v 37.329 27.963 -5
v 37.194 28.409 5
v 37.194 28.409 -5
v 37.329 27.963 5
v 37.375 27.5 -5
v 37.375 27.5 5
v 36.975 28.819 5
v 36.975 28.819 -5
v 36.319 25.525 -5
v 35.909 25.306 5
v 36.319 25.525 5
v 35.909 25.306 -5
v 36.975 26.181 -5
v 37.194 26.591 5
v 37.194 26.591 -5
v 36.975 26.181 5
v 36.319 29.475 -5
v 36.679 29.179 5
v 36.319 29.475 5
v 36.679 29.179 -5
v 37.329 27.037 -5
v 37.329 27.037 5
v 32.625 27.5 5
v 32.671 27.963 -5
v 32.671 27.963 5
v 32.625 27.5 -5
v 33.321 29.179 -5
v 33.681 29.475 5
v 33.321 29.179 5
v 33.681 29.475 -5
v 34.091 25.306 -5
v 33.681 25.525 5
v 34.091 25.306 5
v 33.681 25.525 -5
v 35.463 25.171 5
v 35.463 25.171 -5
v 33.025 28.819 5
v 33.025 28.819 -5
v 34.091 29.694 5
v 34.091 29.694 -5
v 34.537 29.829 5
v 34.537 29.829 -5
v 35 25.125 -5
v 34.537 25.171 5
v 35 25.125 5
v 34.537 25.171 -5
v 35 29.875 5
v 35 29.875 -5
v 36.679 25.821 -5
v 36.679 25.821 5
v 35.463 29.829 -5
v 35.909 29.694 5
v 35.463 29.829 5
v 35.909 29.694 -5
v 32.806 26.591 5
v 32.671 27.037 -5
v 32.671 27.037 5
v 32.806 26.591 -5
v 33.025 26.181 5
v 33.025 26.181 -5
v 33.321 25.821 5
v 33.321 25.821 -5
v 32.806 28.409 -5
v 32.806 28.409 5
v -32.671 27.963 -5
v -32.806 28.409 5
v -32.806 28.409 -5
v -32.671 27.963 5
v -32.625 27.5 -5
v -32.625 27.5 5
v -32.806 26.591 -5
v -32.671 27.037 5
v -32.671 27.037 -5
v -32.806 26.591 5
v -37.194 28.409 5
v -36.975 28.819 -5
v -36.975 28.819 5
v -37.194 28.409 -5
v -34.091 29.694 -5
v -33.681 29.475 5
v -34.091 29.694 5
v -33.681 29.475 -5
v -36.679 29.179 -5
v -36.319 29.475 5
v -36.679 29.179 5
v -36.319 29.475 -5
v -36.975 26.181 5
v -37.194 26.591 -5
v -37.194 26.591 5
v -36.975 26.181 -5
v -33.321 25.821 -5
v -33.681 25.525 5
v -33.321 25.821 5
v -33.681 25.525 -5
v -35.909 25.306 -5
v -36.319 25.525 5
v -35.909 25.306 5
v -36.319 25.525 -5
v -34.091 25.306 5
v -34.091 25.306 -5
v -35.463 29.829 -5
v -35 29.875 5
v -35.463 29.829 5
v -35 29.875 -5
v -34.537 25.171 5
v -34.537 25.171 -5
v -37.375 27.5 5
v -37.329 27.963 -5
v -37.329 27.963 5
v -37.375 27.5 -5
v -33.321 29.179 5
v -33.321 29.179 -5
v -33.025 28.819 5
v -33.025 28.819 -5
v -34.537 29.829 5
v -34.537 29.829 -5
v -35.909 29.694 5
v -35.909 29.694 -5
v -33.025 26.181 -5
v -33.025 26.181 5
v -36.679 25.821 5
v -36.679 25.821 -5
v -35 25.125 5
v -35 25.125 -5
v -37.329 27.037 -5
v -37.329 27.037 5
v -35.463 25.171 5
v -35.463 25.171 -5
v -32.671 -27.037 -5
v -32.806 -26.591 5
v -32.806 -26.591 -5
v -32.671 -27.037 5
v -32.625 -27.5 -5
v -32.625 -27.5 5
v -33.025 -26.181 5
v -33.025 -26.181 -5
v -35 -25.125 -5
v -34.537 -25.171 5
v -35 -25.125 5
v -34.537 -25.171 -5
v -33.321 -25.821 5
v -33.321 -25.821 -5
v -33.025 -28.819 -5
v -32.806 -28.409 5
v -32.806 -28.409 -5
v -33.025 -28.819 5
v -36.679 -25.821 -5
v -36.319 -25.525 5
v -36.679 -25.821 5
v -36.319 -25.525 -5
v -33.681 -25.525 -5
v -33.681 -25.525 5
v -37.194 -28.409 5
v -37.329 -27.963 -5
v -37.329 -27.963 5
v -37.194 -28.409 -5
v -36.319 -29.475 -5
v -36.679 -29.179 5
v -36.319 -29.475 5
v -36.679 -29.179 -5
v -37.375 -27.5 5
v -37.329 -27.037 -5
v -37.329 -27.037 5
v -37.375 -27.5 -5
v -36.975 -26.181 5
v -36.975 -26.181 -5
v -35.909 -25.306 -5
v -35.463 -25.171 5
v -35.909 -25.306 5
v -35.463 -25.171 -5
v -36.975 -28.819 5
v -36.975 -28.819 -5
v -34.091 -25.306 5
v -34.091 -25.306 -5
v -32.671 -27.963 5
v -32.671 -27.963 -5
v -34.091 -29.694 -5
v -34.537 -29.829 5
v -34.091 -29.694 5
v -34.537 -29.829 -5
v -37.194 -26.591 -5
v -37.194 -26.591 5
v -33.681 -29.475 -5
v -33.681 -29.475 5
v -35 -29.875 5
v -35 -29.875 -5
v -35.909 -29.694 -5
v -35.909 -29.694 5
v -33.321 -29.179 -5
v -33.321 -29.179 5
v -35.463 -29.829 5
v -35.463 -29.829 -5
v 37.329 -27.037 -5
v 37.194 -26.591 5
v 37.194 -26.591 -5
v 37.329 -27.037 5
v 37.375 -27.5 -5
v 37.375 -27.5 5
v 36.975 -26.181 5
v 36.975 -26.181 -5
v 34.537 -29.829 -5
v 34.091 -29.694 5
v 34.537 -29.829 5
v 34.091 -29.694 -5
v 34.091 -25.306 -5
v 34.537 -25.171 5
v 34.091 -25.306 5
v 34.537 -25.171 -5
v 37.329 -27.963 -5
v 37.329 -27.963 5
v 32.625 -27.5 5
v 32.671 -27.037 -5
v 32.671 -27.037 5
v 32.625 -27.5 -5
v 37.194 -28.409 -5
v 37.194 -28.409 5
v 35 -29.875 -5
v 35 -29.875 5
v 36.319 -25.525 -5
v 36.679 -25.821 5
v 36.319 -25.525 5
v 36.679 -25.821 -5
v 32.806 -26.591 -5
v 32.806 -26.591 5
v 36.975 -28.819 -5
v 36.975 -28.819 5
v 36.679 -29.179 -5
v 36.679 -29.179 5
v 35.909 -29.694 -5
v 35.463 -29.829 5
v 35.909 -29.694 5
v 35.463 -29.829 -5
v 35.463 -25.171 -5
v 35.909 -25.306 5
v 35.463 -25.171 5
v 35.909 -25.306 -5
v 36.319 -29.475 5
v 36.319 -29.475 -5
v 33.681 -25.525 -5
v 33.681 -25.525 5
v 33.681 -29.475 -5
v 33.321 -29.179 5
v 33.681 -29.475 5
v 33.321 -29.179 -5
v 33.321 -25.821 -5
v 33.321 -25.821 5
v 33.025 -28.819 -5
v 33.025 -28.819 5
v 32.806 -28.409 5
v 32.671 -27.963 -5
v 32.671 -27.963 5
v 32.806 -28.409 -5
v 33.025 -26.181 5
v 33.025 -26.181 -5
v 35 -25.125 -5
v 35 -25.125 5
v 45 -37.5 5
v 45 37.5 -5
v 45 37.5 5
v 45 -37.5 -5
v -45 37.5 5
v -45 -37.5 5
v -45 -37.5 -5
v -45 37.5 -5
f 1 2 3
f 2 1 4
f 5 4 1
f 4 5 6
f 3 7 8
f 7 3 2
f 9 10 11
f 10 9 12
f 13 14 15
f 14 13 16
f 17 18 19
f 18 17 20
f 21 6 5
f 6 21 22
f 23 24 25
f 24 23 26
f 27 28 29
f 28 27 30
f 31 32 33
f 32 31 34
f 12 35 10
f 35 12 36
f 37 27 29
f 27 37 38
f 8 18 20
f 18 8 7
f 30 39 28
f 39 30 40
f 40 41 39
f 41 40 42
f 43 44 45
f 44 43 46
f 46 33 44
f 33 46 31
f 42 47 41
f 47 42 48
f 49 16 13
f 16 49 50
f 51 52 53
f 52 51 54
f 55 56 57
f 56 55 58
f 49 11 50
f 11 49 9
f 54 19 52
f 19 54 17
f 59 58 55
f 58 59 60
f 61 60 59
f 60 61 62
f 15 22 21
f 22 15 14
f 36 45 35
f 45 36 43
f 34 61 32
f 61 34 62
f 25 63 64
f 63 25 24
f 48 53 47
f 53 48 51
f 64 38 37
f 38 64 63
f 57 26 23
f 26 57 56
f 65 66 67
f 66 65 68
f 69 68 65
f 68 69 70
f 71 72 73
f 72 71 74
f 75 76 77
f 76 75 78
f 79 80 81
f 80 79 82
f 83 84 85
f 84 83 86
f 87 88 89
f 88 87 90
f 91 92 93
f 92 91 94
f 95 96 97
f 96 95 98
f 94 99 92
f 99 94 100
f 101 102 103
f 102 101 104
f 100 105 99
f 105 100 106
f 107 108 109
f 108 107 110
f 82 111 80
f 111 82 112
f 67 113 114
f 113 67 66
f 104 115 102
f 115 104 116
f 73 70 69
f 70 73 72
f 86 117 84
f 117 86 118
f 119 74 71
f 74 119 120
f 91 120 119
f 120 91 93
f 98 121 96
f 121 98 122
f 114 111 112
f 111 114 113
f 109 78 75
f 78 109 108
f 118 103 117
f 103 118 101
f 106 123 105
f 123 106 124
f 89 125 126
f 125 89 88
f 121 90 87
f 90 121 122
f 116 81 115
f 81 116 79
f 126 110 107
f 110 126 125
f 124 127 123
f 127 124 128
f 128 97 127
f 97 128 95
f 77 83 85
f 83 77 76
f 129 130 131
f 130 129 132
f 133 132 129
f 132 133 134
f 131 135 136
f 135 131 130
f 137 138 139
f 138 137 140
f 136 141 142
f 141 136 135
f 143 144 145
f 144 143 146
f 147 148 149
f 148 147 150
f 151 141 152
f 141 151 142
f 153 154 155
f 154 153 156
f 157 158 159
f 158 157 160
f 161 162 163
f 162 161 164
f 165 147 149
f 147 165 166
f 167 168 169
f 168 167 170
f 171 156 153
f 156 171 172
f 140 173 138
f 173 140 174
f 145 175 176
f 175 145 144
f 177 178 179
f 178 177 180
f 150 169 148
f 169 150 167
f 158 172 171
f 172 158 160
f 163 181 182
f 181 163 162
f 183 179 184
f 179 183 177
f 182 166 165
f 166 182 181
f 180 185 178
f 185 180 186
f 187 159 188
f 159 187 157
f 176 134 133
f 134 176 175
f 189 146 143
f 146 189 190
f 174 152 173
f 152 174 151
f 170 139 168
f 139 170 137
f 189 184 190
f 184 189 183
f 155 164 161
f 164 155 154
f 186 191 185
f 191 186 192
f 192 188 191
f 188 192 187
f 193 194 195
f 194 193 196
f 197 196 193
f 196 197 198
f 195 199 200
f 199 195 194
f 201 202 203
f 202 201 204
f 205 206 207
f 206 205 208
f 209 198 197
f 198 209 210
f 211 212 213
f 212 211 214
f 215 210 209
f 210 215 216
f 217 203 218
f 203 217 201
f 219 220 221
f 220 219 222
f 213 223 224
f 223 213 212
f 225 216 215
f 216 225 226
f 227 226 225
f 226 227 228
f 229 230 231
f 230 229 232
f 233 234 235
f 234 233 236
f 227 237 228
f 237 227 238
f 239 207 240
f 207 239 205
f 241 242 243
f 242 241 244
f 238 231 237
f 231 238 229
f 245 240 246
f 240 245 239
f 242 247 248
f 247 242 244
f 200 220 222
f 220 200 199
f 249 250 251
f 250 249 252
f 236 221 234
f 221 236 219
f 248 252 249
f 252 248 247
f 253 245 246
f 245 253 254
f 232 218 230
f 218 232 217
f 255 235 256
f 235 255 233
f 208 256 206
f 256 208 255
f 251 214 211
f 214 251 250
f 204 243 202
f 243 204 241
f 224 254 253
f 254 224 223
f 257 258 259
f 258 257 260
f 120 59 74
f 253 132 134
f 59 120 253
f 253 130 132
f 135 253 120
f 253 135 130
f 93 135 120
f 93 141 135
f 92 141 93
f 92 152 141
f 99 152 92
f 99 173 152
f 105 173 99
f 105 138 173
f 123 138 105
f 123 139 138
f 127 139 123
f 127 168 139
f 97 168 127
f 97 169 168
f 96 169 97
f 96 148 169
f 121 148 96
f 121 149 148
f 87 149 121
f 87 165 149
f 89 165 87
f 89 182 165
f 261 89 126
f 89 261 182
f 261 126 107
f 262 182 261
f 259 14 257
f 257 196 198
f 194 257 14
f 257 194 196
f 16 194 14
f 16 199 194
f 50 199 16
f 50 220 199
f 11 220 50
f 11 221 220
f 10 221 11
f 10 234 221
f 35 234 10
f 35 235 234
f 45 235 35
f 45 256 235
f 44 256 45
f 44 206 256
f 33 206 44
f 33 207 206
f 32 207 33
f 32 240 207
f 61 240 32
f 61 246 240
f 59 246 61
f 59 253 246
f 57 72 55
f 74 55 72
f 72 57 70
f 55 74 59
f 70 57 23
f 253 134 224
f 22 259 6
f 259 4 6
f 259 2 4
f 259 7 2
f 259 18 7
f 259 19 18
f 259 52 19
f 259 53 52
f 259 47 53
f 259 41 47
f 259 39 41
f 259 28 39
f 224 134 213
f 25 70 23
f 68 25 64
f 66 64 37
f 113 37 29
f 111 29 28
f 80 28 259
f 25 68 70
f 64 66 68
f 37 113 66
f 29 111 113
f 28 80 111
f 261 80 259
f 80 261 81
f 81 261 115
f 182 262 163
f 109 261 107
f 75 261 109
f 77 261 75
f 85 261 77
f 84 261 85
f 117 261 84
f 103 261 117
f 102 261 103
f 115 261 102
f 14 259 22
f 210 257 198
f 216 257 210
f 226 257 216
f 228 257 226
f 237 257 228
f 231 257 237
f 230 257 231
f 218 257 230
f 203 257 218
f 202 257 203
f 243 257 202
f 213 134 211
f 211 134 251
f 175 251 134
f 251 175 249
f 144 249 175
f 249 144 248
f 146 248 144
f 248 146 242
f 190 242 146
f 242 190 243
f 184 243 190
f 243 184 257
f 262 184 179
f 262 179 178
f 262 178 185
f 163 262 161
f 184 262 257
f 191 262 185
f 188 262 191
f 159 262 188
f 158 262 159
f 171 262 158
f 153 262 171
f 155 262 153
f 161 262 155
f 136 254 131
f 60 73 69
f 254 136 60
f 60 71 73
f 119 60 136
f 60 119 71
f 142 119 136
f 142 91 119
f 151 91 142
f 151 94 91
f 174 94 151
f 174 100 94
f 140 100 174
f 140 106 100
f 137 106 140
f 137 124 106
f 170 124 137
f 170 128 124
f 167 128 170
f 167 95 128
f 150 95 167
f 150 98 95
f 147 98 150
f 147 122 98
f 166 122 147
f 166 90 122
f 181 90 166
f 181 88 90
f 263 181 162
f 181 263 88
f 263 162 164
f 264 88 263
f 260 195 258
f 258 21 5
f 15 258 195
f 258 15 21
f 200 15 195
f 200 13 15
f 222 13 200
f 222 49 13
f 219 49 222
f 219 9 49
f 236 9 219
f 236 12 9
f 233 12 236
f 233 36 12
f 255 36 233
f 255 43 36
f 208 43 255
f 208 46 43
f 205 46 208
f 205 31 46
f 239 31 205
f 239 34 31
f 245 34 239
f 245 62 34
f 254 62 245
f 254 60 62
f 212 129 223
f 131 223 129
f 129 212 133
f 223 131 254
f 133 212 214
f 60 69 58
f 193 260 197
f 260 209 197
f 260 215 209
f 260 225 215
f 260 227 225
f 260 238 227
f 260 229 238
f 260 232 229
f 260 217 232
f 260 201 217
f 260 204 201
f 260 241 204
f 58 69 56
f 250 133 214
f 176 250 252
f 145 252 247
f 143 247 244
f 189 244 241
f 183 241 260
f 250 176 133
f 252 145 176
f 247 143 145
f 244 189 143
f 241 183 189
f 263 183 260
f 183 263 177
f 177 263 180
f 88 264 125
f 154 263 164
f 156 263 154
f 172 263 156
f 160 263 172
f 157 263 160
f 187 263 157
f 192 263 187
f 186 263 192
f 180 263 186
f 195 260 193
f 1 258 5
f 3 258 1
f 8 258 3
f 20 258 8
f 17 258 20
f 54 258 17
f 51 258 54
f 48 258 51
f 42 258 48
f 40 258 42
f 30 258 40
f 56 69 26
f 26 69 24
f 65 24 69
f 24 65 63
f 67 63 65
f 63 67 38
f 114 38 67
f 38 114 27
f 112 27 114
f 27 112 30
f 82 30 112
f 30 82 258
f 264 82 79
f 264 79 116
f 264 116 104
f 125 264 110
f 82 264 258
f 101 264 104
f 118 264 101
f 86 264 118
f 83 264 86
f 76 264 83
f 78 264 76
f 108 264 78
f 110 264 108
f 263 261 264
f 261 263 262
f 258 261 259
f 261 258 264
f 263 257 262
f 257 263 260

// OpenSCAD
$fn = 32;

// ----------------------------------------------------------------------
// Corner plate 90 x 75 x 10
// 4 holes, centres taken from the edge offset
// ----------------------------------------------------------------------

// --- parameters (mm) ---
plate = [90, 75, 10];    // overall size (x, y, z)
holes = 4;               // number of holes the drawing asks for
bore_d = 4.5;            // nominal hole diameter from the drawing
print_allowance = 0.25;  // clearance added for printing
edge = 10;               // hole centre offset from the plate edge

// --- derived feature positions (mm) ---
hole_d = bore_d + print_allowance;  // = 4.75   hole diameter as printed
corner_x = plate[0] / 2 - edge;     // = 35   corner hole X
corner_y = plate[1] / 2 - edge;     // = 27.5   corner hole Y
feature_centers = [
  [corner_x, corner_y],
  [-corner_x, corner_y],
  [-corner_x, -corner_y],
  [corner_x, -corner_y]
];   // hole centres the loop below drills

// plate outline, every hole drilled through with the same cutters
difference() {
  cube(plate, center = true);
  for (centre = feature_centers)
    translate([centre[0], centre[1], 0])
      cylinder(d = hole_d, h = plate[2] + 2, center = true);
}
